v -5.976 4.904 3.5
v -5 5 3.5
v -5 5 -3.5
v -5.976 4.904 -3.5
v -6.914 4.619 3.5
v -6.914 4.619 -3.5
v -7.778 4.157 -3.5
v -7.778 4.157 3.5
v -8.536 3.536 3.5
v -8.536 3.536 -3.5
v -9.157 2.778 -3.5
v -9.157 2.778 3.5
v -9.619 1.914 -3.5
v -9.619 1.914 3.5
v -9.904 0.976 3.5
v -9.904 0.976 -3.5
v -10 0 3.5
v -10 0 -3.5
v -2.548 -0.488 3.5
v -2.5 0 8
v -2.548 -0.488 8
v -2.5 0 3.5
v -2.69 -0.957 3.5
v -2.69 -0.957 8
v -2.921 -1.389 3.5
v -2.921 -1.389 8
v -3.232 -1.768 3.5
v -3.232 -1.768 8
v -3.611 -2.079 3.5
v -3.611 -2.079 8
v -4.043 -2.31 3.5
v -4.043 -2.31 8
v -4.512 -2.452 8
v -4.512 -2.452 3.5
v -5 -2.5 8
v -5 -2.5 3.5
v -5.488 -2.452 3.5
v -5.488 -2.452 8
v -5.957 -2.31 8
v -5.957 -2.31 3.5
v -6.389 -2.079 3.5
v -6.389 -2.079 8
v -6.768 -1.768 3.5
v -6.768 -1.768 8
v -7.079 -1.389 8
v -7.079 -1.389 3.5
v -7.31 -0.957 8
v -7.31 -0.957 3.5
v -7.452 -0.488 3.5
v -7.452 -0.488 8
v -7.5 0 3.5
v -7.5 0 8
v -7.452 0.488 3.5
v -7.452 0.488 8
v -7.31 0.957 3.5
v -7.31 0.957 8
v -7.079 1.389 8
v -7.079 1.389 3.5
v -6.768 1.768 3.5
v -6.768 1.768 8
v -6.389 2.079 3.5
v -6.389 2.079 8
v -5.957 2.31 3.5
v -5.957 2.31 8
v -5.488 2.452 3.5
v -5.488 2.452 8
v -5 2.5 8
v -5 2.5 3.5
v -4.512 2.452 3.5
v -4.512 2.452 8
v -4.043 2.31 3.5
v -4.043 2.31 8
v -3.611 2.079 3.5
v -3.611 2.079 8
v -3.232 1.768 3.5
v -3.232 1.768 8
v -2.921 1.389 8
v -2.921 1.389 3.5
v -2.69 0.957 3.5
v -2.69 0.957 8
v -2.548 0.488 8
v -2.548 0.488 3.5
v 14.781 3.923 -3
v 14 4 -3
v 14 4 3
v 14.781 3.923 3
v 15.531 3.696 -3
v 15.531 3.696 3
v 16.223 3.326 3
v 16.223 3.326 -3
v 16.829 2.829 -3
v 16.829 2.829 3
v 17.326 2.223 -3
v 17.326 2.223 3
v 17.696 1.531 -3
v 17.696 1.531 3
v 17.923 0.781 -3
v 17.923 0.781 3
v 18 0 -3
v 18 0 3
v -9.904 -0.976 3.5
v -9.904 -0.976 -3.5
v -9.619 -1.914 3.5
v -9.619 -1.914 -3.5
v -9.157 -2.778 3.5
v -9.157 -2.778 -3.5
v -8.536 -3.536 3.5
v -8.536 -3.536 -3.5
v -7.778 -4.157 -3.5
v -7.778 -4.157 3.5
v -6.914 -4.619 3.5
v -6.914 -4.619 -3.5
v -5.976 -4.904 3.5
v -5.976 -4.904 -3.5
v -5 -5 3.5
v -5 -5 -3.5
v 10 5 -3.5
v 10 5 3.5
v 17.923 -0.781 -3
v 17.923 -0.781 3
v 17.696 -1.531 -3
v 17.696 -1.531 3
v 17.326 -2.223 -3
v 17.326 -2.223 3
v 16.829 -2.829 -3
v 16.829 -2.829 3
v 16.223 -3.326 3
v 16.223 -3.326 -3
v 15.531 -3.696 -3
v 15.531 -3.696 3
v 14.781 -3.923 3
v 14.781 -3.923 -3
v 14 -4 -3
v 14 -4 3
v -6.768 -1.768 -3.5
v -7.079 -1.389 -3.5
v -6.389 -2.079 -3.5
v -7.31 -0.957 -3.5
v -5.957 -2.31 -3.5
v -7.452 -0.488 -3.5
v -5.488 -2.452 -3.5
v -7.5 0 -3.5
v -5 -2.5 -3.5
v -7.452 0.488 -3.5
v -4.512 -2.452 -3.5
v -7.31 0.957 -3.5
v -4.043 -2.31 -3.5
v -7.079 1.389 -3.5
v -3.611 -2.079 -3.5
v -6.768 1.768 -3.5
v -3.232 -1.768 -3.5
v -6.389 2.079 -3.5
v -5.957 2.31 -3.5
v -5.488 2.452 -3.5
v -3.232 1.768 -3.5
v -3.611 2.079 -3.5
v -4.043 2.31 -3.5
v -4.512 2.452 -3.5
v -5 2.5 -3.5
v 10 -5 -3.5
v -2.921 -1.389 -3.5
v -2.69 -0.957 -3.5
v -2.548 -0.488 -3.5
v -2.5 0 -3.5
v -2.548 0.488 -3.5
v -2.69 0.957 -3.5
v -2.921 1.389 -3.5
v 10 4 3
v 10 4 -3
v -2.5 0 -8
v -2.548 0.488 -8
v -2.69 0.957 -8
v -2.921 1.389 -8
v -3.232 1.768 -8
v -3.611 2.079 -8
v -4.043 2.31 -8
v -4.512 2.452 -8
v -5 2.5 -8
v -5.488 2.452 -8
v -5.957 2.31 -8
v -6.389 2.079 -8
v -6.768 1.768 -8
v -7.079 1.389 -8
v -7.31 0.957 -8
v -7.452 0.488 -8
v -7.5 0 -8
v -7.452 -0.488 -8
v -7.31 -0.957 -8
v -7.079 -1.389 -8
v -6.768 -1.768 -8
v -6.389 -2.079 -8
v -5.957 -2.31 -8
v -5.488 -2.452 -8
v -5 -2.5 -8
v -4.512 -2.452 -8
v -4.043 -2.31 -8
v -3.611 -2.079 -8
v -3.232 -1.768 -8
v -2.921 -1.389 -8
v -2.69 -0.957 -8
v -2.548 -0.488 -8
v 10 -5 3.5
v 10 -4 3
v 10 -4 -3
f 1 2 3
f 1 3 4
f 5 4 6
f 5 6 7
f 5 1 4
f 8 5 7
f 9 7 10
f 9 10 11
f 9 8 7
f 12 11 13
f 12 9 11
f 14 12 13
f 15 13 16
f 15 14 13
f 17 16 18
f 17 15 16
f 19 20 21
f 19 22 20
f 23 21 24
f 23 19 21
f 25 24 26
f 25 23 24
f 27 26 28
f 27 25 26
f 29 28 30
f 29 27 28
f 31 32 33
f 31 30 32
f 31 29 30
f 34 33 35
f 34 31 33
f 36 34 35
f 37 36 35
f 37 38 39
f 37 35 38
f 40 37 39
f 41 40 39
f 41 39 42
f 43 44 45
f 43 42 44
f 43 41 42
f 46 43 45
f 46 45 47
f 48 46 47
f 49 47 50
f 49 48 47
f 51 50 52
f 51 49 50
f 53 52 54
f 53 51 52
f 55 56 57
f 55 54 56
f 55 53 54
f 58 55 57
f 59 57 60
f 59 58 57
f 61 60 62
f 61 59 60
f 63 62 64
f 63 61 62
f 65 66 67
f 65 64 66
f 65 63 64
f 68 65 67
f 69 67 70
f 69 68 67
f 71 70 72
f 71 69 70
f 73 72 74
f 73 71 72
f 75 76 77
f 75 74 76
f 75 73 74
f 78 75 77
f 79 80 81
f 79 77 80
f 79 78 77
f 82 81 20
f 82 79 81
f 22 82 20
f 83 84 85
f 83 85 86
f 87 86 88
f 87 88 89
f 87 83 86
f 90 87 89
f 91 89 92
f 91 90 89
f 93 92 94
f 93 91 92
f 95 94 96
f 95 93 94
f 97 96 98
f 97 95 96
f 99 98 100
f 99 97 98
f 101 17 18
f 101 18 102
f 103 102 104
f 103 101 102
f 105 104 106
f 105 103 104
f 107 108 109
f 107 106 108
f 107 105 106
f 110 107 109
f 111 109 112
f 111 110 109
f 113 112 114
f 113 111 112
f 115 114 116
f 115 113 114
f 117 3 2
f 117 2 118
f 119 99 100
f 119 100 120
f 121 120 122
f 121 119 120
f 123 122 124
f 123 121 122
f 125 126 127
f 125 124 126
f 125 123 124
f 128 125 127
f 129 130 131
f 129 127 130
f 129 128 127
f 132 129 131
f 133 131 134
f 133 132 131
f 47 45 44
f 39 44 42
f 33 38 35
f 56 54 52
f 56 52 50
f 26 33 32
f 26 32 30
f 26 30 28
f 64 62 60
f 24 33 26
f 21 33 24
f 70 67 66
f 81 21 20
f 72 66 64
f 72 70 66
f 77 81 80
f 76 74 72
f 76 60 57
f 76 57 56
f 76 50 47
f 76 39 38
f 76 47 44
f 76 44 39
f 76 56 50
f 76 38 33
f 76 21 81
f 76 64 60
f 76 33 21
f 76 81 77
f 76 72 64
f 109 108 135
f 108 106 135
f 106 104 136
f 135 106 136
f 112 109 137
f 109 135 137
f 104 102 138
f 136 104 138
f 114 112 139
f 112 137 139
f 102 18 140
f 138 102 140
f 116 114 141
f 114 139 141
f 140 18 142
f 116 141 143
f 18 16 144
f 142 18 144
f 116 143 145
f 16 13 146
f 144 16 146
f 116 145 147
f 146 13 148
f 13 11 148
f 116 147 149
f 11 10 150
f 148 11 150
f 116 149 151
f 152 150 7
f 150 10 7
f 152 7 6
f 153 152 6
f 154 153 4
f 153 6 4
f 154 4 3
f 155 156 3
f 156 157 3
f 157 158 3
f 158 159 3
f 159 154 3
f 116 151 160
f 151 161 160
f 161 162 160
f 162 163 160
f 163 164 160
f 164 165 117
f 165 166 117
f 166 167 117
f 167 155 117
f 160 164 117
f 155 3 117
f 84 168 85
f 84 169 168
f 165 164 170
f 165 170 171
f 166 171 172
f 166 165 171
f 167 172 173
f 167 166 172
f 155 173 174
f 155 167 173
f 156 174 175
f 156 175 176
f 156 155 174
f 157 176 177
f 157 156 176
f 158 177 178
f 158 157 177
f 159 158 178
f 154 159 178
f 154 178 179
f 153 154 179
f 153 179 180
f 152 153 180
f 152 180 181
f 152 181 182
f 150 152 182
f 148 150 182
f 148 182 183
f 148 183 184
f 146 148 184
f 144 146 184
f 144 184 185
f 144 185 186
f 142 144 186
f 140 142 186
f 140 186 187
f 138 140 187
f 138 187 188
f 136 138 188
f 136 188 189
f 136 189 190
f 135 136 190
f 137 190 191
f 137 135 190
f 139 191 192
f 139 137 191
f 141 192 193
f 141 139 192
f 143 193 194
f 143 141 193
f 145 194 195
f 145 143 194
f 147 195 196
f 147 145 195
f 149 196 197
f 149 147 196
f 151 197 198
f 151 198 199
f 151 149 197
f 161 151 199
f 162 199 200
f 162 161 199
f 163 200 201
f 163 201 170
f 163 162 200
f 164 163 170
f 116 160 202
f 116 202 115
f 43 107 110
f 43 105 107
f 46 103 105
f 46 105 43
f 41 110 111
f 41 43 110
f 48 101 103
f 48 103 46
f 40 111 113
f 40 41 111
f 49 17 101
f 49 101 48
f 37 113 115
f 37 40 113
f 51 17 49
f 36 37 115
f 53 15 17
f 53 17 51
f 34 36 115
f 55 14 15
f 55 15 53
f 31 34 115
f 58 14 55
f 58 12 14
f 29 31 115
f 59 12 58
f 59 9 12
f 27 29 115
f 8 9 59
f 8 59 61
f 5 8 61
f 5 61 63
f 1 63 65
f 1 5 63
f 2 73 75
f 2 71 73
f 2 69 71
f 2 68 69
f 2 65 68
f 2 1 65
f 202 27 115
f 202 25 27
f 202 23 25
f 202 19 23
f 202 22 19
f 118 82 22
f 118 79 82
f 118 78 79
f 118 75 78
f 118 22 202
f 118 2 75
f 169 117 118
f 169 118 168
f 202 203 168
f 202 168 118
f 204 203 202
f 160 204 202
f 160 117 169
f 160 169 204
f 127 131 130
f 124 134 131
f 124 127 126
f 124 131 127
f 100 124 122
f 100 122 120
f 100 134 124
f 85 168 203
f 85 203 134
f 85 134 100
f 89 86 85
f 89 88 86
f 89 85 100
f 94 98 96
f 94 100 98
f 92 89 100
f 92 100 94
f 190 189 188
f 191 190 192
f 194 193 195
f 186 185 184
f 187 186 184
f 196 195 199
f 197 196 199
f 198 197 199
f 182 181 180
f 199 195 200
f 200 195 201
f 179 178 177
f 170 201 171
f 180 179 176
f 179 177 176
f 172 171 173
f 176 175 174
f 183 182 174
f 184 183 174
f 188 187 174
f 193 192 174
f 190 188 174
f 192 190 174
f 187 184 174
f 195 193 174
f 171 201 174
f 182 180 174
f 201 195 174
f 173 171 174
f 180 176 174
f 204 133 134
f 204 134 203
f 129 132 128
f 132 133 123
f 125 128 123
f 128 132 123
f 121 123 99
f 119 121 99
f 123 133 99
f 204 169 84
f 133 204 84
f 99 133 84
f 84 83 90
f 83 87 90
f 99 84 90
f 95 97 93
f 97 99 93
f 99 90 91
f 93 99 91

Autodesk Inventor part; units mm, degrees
ref_plane "YZ Plane" through (0, 0, 0) normal (1, 0, 0) x (0, 1, 0)
ref_plane "XZ Plane" through (0, 0, 0) normal (0, 1, 0) x (-1, 0, 0)
sketch "스케치1" plane through (0, 0, 0) normal (0, 0, 1) x (1, 0, 0)
  line L0 (-10, 5) -> (10, 5)
  line L1 (10, 5) -> (10, -5)
  line L2 (10, -5) -> (-10, -5)
  line L3 (-10, -5) -> (-10, 5)
  line L4 (-10, 5) -> (10, -5) construction
  line L5 (10, 5) -> (-10, -5) construction
  line L6 (10, 4) -> (18, 4)
  line L7 (18, 4) -> (18, -4)
  line L8 (18, -4) -> (10, -4)
  line L9 (10, -4) -> (10, 4)
  circle A0 centre (-5, 0) radius 2.5
  point P0 (0, 0)
  point P1 (0, 0)
  point P2 (18, 0)
  dimension "d0" = 20
  dimension "d1" = 10
  dimension "d2" = 8
  dimension "d3" = 8
  dimension "d4" = 5
  dimension "d5" = 15
  dimension "d6" = 5
extrude "돌출1" add sketch "스케치1" along normal mid plane 16 contours A0
extrude "돌출2" add sketch "스케치1" along normal mid plane 7 contours L0 L1 L2 L3
extrude "돌출3" add sketch "스케치1" along normal mid plane 6 contours L6 L7 L8 L1
fillet "모깎기1" radius 4 2 edges at (18, 4, 0) (18, -4, 0)
fillet "모깎기2" radius 5 2 edges at (-10, 5, 0) (-10, -5, 0)
properties part number "03-2"
